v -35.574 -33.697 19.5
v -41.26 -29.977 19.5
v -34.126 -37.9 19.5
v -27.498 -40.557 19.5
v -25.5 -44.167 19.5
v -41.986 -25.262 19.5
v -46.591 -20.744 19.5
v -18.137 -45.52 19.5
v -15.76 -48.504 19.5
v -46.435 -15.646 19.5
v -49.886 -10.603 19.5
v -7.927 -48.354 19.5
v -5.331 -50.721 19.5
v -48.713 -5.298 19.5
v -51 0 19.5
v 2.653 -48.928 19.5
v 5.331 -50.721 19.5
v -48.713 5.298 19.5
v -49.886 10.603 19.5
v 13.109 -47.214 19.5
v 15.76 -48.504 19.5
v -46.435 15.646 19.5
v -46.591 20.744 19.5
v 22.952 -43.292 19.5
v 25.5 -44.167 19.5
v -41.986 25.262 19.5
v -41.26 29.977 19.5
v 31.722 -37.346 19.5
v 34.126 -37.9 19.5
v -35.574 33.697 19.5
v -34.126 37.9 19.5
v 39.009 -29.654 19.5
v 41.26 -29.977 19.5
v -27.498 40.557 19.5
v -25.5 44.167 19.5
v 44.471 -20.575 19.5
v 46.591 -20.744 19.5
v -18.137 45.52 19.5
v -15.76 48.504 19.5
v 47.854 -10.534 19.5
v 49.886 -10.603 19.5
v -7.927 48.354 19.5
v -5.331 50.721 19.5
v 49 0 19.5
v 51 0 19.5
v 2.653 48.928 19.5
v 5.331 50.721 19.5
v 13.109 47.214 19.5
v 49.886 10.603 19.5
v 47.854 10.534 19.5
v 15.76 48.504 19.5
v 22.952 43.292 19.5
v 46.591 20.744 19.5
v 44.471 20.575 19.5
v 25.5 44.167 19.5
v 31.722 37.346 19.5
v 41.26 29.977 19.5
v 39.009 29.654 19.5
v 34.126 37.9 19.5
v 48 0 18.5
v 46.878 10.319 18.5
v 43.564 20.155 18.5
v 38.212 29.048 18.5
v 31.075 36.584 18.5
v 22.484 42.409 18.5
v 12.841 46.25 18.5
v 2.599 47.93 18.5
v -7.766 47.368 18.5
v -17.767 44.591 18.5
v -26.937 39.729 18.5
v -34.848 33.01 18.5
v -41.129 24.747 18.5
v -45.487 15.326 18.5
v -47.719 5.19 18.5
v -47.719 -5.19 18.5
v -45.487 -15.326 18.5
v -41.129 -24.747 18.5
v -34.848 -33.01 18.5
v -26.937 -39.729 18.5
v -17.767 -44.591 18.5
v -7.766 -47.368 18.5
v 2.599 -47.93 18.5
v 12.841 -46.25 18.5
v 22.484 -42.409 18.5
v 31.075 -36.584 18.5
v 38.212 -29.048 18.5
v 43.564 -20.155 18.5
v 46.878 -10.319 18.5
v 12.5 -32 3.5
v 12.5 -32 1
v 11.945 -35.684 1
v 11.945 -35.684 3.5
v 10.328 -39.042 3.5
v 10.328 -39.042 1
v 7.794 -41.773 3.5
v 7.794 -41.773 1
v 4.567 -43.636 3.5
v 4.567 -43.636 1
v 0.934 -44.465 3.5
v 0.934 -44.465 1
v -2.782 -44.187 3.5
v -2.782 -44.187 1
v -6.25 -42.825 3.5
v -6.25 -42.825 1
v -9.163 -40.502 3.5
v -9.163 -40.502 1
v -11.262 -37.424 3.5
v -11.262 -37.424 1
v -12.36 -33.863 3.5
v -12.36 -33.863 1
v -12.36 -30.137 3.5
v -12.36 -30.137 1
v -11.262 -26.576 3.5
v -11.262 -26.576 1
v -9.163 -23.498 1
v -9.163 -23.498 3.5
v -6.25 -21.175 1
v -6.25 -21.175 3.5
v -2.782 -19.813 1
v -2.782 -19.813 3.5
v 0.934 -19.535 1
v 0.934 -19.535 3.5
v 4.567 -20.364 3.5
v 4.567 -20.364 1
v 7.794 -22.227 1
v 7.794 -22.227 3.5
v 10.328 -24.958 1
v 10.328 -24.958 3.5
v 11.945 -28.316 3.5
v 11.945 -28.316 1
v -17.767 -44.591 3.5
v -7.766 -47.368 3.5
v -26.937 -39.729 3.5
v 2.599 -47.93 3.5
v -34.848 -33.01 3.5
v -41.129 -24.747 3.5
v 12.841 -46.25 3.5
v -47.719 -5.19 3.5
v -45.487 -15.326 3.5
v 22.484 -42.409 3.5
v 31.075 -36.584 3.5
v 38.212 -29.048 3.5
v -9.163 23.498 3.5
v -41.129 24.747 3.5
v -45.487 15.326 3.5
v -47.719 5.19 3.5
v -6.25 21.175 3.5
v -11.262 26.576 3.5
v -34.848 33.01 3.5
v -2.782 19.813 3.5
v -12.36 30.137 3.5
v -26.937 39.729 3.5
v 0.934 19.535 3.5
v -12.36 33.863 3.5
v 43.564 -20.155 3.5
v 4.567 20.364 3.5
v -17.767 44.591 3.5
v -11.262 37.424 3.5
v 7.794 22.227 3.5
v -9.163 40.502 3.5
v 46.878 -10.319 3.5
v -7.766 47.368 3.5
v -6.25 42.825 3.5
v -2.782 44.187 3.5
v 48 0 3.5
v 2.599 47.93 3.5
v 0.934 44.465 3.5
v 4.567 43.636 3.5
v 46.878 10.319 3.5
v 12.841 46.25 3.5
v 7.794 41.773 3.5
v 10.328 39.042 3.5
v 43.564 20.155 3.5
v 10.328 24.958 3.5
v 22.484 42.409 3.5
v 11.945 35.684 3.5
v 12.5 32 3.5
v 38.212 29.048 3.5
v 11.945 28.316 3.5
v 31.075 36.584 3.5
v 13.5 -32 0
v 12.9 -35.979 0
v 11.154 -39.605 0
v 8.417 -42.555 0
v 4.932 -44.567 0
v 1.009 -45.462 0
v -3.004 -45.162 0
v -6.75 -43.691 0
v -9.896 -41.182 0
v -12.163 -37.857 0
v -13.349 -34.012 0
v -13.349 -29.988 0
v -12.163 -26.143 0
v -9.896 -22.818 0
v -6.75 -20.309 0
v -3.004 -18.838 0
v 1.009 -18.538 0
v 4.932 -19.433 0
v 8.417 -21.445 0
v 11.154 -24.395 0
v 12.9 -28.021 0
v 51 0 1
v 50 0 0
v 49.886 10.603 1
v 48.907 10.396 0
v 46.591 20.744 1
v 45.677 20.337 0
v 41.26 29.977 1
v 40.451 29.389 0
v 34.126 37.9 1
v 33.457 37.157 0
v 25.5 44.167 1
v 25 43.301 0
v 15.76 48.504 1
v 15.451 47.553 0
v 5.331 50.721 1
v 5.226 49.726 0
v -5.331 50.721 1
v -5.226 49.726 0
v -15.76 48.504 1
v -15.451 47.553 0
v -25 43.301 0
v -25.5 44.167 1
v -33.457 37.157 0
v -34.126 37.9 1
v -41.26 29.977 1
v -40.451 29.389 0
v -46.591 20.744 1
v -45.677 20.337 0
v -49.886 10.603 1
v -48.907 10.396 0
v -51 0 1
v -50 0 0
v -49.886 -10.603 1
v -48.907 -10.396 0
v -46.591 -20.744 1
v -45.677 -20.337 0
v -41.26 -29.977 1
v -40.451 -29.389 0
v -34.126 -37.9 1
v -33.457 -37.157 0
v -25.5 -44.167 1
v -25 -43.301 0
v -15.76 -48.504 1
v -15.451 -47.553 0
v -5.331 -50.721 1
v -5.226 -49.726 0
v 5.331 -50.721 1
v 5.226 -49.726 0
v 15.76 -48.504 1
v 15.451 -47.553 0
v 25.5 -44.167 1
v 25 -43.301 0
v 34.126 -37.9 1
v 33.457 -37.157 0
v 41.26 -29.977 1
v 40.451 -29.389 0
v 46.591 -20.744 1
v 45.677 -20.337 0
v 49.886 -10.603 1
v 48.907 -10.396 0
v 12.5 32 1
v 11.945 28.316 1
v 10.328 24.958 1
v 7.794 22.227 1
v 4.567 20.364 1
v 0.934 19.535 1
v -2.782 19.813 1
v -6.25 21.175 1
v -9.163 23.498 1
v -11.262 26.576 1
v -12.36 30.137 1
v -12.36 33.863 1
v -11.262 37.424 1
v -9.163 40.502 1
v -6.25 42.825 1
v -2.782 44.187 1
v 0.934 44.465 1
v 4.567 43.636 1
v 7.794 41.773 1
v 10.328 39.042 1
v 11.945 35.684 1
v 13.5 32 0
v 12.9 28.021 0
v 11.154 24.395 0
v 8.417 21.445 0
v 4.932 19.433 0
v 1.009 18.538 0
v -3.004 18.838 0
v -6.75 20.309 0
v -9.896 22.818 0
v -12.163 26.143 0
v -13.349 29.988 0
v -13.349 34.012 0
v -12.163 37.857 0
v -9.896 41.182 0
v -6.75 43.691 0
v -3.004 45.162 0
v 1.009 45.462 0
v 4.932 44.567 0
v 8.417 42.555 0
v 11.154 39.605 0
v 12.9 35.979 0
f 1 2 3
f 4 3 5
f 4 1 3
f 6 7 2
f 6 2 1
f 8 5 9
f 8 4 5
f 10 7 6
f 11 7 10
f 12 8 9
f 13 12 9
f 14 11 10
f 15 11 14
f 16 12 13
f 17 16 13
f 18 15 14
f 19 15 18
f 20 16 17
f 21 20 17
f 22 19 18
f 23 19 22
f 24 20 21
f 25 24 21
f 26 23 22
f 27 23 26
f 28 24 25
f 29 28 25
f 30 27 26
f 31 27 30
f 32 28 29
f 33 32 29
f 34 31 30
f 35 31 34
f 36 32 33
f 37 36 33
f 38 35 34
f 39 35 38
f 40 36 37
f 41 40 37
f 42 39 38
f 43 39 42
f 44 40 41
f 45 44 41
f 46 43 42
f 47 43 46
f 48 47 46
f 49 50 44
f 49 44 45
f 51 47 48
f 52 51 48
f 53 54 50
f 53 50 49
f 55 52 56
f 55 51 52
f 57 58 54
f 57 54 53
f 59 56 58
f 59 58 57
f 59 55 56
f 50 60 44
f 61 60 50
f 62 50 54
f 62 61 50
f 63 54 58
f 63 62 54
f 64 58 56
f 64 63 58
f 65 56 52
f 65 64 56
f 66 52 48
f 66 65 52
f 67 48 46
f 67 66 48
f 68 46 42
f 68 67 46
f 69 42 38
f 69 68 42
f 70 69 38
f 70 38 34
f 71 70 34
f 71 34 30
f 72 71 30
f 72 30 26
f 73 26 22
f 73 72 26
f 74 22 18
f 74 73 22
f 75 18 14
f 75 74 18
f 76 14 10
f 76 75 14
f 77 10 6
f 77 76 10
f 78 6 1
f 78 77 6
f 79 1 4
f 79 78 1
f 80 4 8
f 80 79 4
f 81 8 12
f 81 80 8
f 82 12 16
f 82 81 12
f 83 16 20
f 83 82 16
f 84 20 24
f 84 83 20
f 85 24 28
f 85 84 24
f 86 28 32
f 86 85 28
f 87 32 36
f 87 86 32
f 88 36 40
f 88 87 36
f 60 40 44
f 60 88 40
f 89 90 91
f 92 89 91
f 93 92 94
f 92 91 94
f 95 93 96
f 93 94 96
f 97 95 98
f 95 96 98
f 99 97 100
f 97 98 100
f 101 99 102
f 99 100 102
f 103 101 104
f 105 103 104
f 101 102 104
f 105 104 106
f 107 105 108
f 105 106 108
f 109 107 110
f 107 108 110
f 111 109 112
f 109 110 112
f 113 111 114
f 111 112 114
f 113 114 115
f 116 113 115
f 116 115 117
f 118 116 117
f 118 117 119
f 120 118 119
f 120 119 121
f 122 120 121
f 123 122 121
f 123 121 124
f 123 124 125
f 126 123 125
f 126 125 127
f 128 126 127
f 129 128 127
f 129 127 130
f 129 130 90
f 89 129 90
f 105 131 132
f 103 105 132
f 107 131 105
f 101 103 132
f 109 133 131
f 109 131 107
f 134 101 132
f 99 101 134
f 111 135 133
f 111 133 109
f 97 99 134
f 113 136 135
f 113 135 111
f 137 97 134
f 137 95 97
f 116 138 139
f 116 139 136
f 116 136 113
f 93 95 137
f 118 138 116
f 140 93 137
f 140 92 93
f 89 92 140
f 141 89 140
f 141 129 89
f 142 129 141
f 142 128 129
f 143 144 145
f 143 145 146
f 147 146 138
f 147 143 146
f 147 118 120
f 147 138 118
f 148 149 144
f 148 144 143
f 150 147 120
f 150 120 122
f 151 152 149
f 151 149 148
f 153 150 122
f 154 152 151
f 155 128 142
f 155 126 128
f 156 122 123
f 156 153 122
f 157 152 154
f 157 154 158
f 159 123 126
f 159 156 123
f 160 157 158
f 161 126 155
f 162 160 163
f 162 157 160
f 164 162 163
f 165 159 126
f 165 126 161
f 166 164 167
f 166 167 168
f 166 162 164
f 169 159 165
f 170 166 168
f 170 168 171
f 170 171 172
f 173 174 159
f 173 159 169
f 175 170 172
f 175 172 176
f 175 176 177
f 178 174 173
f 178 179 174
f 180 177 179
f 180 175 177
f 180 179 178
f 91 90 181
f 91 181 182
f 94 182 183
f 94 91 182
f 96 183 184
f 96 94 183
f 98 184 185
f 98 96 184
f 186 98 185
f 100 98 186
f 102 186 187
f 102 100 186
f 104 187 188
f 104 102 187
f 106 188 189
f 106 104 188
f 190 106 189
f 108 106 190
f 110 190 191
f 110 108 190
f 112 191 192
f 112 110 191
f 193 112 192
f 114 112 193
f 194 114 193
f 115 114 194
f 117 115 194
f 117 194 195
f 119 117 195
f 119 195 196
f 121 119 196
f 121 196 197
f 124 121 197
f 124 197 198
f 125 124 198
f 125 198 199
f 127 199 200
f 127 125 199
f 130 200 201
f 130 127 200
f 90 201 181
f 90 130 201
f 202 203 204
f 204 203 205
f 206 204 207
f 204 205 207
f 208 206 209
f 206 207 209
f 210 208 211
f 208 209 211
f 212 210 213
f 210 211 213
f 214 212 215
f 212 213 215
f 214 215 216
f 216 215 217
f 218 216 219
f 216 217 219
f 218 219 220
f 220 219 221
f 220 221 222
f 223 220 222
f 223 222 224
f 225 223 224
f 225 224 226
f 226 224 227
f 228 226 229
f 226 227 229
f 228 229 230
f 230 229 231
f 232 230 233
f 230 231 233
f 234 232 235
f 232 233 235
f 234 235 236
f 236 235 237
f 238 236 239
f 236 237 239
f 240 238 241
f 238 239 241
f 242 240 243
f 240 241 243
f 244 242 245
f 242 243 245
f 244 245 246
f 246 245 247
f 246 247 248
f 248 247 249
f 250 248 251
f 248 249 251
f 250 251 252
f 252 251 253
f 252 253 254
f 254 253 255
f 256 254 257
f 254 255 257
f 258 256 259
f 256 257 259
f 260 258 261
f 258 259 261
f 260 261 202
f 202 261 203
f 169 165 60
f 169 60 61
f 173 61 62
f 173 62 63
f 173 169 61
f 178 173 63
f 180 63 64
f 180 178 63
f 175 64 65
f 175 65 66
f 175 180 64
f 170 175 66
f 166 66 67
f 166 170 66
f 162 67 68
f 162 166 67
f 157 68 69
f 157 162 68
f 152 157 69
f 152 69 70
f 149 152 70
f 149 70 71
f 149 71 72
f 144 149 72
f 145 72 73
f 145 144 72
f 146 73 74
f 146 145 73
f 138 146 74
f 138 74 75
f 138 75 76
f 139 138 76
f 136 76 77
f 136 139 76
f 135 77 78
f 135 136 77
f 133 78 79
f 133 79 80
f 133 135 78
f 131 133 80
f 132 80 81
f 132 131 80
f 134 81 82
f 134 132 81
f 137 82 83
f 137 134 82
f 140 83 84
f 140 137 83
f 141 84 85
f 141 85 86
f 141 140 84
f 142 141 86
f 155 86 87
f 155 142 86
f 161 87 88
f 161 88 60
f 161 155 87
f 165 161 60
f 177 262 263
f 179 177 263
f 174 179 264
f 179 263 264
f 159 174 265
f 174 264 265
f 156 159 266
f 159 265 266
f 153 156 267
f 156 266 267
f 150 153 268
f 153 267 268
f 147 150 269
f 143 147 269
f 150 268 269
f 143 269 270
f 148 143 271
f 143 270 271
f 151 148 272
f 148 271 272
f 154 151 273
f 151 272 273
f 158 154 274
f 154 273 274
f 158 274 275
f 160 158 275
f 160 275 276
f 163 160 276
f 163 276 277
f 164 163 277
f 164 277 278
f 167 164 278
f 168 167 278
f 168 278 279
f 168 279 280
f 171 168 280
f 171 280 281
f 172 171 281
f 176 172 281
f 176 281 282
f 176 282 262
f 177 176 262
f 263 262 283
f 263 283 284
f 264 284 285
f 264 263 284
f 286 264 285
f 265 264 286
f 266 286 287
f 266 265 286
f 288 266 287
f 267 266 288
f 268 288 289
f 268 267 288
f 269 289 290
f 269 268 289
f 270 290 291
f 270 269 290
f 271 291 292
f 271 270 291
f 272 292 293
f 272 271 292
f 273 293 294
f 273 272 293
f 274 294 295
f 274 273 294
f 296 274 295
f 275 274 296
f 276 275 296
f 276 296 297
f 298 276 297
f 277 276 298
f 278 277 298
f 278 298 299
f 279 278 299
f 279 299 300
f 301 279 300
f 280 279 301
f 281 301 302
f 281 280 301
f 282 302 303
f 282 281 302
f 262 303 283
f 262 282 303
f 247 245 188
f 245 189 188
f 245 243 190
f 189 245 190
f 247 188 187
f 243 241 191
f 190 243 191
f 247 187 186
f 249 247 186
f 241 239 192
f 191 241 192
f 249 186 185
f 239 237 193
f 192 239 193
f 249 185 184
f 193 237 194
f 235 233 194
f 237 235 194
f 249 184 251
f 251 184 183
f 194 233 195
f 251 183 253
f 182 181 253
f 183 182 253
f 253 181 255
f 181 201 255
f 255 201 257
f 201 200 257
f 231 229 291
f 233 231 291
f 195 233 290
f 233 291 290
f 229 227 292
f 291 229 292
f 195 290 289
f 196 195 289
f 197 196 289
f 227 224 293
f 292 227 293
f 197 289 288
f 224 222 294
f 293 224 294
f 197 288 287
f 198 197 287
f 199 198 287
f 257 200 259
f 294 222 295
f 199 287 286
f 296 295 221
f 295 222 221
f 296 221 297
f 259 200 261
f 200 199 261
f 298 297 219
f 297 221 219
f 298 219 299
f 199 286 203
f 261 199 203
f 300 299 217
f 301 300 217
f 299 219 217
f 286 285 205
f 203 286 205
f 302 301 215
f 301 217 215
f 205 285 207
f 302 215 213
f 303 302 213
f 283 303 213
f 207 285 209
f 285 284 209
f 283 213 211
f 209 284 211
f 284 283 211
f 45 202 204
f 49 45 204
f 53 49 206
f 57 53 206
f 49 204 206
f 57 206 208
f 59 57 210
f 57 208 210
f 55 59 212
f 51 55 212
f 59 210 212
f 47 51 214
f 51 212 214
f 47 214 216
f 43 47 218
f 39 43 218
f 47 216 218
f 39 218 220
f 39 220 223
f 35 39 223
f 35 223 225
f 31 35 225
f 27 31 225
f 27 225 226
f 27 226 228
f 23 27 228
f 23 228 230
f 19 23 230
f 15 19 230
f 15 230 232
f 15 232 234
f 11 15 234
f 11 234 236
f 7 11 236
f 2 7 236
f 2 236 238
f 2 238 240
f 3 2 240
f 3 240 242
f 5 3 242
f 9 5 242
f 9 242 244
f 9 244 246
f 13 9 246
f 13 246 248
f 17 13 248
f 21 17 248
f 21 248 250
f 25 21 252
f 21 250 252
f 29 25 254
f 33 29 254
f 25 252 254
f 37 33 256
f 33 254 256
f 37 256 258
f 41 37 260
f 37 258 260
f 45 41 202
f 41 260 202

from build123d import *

# Parameters (mm, degrees)
F0_R     = 51
F1_DEPTH = 3.5
F2_R     = 51
F2_R_2   = 48
F3_DEPTH = 16
F4_R     = 12.5
F5_DEPTH = 25
F6_SIZE  = 1
F7_SIZE  = 1


with BuildPart() as f1:
    # F0 (on Top) → F1 (new body)
    with BuildSketch(Plane.XY):
        Circle(F0_R)
    extrude(amount=F1_DEPTH)

    # F2 (on face) → F3 (join)
    with BuildSketch(Plane.XY.offset(3.5)):
        Circle(F2_R)
        Circle(F2_R_2, mode=Mode.SUBTRACT)
    extrude(amount=F3_DEPTH)

    # F4 (on face) → F5 (cut)
    with BuildSketch(Plane(origin=(0, 0, 0), x_dir=(1, 0, 0), z_dir=(0, 0, -1))):
        with Locations((0, 32)):
            Circle(F4_R)
        with Locations((0, -32)):
            Circle(F4_R)
    extrude(amount=-F5_DEPTH, mode=Mode.SUBTRACT)

    # F6
    f6_edges = [f1.edges().sort_by_distance(p)[0] for p in [
        (-51, 0, 0),
        (-12.5, 32, 0),
        (-12.5, -32, 0),
    ]]
    chamfer(f6_edges, length=F6_SIZE)

    # F7
    f7_edges = [f1.edges().sort_by_distance(p)[0] for p in [
        (-48, 0, 19.5),
    ]]
    chamfer(f7_edges, length=F7_SIZE)


solid = f1.part
